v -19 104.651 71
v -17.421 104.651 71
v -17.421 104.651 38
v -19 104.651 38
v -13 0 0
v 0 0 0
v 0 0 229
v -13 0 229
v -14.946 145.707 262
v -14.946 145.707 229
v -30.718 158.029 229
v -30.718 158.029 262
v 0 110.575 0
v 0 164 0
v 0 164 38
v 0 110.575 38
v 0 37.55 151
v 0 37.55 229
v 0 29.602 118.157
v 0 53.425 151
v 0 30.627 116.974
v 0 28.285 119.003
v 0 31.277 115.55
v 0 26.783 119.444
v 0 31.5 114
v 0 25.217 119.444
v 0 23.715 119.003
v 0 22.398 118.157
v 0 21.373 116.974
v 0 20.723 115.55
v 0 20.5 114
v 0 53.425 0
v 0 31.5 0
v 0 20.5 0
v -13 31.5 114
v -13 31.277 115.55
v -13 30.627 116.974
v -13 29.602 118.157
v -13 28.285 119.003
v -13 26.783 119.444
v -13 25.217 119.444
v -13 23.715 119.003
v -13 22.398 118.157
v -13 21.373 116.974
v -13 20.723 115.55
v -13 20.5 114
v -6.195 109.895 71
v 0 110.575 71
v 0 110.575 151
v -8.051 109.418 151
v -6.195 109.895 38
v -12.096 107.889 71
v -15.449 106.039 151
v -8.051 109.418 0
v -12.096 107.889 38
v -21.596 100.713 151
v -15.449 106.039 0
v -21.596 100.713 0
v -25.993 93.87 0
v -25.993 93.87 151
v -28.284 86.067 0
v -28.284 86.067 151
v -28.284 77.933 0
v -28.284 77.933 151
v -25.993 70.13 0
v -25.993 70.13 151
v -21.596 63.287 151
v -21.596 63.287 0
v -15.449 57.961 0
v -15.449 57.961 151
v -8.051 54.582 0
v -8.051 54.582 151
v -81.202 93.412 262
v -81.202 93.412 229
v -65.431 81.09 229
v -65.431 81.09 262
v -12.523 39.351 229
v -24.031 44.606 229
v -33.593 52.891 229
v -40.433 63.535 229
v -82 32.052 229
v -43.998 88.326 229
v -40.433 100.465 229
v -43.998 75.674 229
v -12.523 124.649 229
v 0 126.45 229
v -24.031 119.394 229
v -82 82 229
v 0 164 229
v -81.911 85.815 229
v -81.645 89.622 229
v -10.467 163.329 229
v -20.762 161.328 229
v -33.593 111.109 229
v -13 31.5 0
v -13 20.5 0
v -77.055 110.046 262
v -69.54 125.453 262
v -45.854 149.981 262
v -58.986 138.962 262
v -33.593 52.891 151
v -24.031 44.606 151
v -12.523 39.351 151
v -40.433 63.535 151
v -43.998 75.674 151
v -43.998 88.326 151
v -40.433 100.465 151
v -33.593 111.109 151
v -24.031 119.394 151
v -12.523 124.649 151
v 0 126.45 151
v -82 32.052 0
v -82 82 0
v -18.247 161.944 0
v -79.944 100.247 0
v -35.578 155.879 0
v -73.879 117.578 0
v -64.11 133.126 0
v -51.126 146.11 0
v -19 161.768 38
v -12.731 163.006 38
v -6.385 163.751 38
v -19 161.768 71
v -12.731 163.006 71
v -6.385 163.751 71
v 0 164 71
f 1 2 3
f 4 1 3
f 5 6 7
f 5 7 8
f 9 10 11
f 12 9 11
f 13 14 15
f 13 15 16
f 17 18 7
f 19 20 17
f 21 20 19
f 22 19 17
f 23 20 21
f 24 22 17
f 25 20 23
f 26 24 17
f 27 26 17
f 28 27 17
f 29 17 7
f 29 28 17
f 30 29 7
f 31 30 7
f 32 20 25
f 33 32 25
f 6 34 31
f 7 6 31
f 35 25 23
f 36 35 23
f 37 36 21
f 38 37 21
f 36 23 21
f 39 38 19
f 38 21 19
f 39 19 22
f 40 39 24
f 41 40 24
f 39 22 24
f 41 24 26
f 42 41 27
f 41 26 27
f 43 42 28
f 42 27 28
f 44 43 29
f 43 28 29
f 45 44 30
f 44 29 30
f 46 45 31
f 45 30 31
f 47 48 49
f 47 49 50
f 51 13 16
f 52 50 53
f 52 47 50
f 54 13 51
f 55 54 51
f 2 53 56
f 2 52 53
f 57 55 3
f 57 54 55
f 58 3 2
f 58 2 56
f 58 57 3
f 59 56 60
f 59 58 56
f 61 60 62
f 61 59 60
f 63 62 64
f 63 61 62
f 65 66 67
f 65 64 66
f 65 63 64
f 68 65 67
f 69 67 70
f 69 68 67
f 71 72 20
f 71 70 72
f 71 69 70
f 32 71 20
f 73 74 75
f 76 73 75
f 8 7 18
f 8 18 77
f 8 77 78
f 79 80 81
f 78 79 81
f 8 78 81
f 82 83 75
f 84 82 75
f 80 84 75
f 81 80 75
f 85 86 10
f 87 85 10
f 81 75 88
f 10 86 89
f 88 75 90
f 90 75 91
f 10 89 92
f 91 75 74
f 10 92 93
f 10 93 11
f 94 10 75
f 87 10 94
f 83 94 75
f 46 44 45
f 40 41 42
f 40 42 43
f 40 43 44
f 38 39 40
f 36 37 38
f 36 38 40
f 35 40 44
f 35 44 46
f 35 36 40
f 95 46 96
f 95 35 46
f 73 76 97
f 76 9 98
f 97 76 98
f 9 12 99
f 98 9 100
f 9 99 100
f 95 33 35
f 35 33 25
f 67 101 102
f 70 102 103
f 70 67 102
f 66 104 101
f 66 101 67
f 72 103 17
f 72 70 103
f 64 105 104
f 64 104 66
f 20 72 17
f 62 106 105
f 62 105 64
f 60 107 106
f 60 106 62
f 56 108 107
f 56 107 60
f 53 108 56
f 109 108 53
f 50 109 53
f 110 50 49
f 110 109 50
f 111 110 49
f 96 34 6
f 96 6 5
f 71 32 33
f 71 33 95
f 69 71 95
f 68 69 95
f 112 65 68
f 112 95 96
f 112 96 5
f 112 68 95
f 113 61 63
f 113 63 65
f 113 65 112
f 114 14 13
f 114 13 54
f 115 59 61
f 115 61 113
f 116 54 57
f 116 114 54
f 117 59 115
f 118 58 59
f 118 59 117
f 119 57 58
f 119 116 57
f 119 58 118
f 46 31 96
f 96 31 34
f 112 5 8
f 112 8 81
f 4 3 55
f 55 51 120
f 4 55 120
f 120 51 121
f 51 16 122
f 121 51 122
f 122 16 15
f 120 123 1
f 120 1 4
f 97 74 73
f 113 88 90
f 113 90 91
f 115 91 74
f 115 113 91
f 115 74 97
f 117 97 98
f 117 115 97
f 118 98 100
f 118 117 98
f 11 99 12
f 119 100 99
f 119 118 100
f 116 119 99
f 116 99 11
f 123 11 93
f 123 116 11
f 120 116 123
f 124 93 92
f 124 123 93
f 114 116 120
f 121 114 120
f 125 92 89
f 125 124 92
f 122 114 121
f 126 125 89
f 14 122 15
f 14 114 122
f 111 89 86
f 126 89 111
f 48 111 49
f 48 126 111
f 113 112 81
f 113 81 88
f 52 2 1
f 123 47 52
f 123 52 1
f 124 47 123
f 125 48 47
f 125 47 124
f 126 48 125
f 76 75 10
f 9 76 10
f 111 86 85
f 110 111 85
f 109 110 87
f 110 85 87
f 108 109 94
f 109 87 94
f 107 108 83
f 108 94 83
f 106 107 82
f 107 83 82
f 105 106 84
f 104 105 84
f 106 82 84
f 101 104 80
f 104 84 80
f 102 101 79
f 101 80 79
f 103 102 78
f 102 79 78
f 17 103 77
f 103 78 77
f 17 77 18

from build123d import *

# Parameters (mm, degrees)
BOSS_EXTRUDE1_DEPTH = 262
CUT_EXTRUDE3_START  = -33
CUT_EXTRUDE3_DEPTH  = 33
SKETCH4_R           = 44.45
CUT_EXTRUDE4_DEPTH  = 78
SKETCH6_W           = 33
SKETCH6_H           = 59.34931139
CUT_EXTRUDE6_DEPTH  = 19
SKETCH7_R           = 5.5
CUT_EXTRUDE7_DEPTH  = 13


with BuildPart() as part:
    # Sketch1 → Boss-Extrude1 (new body)
    with BuildSketch(Plane.XY):
        with BuildLine():
            Line((0, 0), (-13, 0))
            Line((-13, 0), (-82, 32.051995773))
            Line((-82, 32.051995773), (-82, 82))
            ThreePointArc((-82, 82), (-57.982756057, 139.982756057), (0, 164))
            Line((0, 164), (0, 110.575))
            ThreePointArc((0, 110.575), (-28.575, 82), (0, 53.425))
            Line((0, 53.425), (0, 0))
        make_face()
    extrude(amount=BOSS_EXTRUDE1_DEPTH)

    # Sketch2 → Cut-Extrude3 (cut)
    with BuildSketch(Plane.XY.offset(262).offset(CUT_EXTRUDE3_START)):
        with BuildLine():
            Line((0, 53.425), (0, 0))
            Line((0, 0), (-13, 0))
            Line((-13, 0), (-82, 32.051995773))
            Line((-82, 32.051995773), (-82, 82))
            ThreePointArc((-82, 82), (-81.800252121, 87.720030847), (-81.201981637, 93.412194279))
            Line((-81.201981637, 93.412194279), (-65.430668922, 81.090294344))
            Line((-65.430668922, 81.090294344), (-14.946427946, 145.707176139))
            Line((-14.946427946, 145.707176139), (-30.71774066, 158.029076074))
            ThreePointArc((-30.71774066, 158.029076074), (-15.646337621, 162.493429043), (0, 164))
            Line((0, 164), (0, 110.575))
            ThreePointArc((0, 110.575), (-28.575, 82), (0, 53.425))
        make_face()
    extrude(amount=CUT_EXTRUDE3_DEPTH, mode=Mode.SUBTRACT)

    # Sketch4 → Cut-Extrude4 (cut)
    with BuildSketch(Plane.XY.offset(229)):
        with Locations((0, 82)):
            Circle(SKETCH4_R)
    extrude(amount=-CUT_EXTRUDE4_DEPTH, mode=Mode.SUBTRACT)

    # Sketch6 → Cut-Extrude6 (cut)
    with BuildSketch(Plane(origin=(0, 0, 0), x_dir=(0, 0, -1), z_dir=(1, 0, 0))):
        with Locations((-54.5, 134.325344305)):
            Rectangle(SKETCH6_W, SKETCH6_H)
    extrude(amount=-CUT_EXTRUDE6_DEPTH, mode=Mode.SUBTRACT)

    # Sketch7 → Cut-Extrude7 (cut)
    with BuildSketch(Plane(origin=(0, 0, 0), x_dir=(0, 0, -1), z_dir=(1, 0, 0))):
        with BuildLine():
            ThreePointArc((-108.5, 26), (-110.110912703, 22.110912703), (-114, 20.5))
            Line((-114, 20.5), (0, 20.5))
            Line((0, 20.5), (0, 31.5))
            Line((0, 31.5), (-114, 31.5))
            ThreePointArc((-114, 31.5), (-110.110912703, 29.889087297), (-108.5, 26))
        make_face()
        with Locations((-114, 26)):
            Circle(SKETCH7_R)
    extrude(amount=-CUT_EXTRUDE7_DEPTH, mode=Mode.SUBTRACT)


solid = part.part
